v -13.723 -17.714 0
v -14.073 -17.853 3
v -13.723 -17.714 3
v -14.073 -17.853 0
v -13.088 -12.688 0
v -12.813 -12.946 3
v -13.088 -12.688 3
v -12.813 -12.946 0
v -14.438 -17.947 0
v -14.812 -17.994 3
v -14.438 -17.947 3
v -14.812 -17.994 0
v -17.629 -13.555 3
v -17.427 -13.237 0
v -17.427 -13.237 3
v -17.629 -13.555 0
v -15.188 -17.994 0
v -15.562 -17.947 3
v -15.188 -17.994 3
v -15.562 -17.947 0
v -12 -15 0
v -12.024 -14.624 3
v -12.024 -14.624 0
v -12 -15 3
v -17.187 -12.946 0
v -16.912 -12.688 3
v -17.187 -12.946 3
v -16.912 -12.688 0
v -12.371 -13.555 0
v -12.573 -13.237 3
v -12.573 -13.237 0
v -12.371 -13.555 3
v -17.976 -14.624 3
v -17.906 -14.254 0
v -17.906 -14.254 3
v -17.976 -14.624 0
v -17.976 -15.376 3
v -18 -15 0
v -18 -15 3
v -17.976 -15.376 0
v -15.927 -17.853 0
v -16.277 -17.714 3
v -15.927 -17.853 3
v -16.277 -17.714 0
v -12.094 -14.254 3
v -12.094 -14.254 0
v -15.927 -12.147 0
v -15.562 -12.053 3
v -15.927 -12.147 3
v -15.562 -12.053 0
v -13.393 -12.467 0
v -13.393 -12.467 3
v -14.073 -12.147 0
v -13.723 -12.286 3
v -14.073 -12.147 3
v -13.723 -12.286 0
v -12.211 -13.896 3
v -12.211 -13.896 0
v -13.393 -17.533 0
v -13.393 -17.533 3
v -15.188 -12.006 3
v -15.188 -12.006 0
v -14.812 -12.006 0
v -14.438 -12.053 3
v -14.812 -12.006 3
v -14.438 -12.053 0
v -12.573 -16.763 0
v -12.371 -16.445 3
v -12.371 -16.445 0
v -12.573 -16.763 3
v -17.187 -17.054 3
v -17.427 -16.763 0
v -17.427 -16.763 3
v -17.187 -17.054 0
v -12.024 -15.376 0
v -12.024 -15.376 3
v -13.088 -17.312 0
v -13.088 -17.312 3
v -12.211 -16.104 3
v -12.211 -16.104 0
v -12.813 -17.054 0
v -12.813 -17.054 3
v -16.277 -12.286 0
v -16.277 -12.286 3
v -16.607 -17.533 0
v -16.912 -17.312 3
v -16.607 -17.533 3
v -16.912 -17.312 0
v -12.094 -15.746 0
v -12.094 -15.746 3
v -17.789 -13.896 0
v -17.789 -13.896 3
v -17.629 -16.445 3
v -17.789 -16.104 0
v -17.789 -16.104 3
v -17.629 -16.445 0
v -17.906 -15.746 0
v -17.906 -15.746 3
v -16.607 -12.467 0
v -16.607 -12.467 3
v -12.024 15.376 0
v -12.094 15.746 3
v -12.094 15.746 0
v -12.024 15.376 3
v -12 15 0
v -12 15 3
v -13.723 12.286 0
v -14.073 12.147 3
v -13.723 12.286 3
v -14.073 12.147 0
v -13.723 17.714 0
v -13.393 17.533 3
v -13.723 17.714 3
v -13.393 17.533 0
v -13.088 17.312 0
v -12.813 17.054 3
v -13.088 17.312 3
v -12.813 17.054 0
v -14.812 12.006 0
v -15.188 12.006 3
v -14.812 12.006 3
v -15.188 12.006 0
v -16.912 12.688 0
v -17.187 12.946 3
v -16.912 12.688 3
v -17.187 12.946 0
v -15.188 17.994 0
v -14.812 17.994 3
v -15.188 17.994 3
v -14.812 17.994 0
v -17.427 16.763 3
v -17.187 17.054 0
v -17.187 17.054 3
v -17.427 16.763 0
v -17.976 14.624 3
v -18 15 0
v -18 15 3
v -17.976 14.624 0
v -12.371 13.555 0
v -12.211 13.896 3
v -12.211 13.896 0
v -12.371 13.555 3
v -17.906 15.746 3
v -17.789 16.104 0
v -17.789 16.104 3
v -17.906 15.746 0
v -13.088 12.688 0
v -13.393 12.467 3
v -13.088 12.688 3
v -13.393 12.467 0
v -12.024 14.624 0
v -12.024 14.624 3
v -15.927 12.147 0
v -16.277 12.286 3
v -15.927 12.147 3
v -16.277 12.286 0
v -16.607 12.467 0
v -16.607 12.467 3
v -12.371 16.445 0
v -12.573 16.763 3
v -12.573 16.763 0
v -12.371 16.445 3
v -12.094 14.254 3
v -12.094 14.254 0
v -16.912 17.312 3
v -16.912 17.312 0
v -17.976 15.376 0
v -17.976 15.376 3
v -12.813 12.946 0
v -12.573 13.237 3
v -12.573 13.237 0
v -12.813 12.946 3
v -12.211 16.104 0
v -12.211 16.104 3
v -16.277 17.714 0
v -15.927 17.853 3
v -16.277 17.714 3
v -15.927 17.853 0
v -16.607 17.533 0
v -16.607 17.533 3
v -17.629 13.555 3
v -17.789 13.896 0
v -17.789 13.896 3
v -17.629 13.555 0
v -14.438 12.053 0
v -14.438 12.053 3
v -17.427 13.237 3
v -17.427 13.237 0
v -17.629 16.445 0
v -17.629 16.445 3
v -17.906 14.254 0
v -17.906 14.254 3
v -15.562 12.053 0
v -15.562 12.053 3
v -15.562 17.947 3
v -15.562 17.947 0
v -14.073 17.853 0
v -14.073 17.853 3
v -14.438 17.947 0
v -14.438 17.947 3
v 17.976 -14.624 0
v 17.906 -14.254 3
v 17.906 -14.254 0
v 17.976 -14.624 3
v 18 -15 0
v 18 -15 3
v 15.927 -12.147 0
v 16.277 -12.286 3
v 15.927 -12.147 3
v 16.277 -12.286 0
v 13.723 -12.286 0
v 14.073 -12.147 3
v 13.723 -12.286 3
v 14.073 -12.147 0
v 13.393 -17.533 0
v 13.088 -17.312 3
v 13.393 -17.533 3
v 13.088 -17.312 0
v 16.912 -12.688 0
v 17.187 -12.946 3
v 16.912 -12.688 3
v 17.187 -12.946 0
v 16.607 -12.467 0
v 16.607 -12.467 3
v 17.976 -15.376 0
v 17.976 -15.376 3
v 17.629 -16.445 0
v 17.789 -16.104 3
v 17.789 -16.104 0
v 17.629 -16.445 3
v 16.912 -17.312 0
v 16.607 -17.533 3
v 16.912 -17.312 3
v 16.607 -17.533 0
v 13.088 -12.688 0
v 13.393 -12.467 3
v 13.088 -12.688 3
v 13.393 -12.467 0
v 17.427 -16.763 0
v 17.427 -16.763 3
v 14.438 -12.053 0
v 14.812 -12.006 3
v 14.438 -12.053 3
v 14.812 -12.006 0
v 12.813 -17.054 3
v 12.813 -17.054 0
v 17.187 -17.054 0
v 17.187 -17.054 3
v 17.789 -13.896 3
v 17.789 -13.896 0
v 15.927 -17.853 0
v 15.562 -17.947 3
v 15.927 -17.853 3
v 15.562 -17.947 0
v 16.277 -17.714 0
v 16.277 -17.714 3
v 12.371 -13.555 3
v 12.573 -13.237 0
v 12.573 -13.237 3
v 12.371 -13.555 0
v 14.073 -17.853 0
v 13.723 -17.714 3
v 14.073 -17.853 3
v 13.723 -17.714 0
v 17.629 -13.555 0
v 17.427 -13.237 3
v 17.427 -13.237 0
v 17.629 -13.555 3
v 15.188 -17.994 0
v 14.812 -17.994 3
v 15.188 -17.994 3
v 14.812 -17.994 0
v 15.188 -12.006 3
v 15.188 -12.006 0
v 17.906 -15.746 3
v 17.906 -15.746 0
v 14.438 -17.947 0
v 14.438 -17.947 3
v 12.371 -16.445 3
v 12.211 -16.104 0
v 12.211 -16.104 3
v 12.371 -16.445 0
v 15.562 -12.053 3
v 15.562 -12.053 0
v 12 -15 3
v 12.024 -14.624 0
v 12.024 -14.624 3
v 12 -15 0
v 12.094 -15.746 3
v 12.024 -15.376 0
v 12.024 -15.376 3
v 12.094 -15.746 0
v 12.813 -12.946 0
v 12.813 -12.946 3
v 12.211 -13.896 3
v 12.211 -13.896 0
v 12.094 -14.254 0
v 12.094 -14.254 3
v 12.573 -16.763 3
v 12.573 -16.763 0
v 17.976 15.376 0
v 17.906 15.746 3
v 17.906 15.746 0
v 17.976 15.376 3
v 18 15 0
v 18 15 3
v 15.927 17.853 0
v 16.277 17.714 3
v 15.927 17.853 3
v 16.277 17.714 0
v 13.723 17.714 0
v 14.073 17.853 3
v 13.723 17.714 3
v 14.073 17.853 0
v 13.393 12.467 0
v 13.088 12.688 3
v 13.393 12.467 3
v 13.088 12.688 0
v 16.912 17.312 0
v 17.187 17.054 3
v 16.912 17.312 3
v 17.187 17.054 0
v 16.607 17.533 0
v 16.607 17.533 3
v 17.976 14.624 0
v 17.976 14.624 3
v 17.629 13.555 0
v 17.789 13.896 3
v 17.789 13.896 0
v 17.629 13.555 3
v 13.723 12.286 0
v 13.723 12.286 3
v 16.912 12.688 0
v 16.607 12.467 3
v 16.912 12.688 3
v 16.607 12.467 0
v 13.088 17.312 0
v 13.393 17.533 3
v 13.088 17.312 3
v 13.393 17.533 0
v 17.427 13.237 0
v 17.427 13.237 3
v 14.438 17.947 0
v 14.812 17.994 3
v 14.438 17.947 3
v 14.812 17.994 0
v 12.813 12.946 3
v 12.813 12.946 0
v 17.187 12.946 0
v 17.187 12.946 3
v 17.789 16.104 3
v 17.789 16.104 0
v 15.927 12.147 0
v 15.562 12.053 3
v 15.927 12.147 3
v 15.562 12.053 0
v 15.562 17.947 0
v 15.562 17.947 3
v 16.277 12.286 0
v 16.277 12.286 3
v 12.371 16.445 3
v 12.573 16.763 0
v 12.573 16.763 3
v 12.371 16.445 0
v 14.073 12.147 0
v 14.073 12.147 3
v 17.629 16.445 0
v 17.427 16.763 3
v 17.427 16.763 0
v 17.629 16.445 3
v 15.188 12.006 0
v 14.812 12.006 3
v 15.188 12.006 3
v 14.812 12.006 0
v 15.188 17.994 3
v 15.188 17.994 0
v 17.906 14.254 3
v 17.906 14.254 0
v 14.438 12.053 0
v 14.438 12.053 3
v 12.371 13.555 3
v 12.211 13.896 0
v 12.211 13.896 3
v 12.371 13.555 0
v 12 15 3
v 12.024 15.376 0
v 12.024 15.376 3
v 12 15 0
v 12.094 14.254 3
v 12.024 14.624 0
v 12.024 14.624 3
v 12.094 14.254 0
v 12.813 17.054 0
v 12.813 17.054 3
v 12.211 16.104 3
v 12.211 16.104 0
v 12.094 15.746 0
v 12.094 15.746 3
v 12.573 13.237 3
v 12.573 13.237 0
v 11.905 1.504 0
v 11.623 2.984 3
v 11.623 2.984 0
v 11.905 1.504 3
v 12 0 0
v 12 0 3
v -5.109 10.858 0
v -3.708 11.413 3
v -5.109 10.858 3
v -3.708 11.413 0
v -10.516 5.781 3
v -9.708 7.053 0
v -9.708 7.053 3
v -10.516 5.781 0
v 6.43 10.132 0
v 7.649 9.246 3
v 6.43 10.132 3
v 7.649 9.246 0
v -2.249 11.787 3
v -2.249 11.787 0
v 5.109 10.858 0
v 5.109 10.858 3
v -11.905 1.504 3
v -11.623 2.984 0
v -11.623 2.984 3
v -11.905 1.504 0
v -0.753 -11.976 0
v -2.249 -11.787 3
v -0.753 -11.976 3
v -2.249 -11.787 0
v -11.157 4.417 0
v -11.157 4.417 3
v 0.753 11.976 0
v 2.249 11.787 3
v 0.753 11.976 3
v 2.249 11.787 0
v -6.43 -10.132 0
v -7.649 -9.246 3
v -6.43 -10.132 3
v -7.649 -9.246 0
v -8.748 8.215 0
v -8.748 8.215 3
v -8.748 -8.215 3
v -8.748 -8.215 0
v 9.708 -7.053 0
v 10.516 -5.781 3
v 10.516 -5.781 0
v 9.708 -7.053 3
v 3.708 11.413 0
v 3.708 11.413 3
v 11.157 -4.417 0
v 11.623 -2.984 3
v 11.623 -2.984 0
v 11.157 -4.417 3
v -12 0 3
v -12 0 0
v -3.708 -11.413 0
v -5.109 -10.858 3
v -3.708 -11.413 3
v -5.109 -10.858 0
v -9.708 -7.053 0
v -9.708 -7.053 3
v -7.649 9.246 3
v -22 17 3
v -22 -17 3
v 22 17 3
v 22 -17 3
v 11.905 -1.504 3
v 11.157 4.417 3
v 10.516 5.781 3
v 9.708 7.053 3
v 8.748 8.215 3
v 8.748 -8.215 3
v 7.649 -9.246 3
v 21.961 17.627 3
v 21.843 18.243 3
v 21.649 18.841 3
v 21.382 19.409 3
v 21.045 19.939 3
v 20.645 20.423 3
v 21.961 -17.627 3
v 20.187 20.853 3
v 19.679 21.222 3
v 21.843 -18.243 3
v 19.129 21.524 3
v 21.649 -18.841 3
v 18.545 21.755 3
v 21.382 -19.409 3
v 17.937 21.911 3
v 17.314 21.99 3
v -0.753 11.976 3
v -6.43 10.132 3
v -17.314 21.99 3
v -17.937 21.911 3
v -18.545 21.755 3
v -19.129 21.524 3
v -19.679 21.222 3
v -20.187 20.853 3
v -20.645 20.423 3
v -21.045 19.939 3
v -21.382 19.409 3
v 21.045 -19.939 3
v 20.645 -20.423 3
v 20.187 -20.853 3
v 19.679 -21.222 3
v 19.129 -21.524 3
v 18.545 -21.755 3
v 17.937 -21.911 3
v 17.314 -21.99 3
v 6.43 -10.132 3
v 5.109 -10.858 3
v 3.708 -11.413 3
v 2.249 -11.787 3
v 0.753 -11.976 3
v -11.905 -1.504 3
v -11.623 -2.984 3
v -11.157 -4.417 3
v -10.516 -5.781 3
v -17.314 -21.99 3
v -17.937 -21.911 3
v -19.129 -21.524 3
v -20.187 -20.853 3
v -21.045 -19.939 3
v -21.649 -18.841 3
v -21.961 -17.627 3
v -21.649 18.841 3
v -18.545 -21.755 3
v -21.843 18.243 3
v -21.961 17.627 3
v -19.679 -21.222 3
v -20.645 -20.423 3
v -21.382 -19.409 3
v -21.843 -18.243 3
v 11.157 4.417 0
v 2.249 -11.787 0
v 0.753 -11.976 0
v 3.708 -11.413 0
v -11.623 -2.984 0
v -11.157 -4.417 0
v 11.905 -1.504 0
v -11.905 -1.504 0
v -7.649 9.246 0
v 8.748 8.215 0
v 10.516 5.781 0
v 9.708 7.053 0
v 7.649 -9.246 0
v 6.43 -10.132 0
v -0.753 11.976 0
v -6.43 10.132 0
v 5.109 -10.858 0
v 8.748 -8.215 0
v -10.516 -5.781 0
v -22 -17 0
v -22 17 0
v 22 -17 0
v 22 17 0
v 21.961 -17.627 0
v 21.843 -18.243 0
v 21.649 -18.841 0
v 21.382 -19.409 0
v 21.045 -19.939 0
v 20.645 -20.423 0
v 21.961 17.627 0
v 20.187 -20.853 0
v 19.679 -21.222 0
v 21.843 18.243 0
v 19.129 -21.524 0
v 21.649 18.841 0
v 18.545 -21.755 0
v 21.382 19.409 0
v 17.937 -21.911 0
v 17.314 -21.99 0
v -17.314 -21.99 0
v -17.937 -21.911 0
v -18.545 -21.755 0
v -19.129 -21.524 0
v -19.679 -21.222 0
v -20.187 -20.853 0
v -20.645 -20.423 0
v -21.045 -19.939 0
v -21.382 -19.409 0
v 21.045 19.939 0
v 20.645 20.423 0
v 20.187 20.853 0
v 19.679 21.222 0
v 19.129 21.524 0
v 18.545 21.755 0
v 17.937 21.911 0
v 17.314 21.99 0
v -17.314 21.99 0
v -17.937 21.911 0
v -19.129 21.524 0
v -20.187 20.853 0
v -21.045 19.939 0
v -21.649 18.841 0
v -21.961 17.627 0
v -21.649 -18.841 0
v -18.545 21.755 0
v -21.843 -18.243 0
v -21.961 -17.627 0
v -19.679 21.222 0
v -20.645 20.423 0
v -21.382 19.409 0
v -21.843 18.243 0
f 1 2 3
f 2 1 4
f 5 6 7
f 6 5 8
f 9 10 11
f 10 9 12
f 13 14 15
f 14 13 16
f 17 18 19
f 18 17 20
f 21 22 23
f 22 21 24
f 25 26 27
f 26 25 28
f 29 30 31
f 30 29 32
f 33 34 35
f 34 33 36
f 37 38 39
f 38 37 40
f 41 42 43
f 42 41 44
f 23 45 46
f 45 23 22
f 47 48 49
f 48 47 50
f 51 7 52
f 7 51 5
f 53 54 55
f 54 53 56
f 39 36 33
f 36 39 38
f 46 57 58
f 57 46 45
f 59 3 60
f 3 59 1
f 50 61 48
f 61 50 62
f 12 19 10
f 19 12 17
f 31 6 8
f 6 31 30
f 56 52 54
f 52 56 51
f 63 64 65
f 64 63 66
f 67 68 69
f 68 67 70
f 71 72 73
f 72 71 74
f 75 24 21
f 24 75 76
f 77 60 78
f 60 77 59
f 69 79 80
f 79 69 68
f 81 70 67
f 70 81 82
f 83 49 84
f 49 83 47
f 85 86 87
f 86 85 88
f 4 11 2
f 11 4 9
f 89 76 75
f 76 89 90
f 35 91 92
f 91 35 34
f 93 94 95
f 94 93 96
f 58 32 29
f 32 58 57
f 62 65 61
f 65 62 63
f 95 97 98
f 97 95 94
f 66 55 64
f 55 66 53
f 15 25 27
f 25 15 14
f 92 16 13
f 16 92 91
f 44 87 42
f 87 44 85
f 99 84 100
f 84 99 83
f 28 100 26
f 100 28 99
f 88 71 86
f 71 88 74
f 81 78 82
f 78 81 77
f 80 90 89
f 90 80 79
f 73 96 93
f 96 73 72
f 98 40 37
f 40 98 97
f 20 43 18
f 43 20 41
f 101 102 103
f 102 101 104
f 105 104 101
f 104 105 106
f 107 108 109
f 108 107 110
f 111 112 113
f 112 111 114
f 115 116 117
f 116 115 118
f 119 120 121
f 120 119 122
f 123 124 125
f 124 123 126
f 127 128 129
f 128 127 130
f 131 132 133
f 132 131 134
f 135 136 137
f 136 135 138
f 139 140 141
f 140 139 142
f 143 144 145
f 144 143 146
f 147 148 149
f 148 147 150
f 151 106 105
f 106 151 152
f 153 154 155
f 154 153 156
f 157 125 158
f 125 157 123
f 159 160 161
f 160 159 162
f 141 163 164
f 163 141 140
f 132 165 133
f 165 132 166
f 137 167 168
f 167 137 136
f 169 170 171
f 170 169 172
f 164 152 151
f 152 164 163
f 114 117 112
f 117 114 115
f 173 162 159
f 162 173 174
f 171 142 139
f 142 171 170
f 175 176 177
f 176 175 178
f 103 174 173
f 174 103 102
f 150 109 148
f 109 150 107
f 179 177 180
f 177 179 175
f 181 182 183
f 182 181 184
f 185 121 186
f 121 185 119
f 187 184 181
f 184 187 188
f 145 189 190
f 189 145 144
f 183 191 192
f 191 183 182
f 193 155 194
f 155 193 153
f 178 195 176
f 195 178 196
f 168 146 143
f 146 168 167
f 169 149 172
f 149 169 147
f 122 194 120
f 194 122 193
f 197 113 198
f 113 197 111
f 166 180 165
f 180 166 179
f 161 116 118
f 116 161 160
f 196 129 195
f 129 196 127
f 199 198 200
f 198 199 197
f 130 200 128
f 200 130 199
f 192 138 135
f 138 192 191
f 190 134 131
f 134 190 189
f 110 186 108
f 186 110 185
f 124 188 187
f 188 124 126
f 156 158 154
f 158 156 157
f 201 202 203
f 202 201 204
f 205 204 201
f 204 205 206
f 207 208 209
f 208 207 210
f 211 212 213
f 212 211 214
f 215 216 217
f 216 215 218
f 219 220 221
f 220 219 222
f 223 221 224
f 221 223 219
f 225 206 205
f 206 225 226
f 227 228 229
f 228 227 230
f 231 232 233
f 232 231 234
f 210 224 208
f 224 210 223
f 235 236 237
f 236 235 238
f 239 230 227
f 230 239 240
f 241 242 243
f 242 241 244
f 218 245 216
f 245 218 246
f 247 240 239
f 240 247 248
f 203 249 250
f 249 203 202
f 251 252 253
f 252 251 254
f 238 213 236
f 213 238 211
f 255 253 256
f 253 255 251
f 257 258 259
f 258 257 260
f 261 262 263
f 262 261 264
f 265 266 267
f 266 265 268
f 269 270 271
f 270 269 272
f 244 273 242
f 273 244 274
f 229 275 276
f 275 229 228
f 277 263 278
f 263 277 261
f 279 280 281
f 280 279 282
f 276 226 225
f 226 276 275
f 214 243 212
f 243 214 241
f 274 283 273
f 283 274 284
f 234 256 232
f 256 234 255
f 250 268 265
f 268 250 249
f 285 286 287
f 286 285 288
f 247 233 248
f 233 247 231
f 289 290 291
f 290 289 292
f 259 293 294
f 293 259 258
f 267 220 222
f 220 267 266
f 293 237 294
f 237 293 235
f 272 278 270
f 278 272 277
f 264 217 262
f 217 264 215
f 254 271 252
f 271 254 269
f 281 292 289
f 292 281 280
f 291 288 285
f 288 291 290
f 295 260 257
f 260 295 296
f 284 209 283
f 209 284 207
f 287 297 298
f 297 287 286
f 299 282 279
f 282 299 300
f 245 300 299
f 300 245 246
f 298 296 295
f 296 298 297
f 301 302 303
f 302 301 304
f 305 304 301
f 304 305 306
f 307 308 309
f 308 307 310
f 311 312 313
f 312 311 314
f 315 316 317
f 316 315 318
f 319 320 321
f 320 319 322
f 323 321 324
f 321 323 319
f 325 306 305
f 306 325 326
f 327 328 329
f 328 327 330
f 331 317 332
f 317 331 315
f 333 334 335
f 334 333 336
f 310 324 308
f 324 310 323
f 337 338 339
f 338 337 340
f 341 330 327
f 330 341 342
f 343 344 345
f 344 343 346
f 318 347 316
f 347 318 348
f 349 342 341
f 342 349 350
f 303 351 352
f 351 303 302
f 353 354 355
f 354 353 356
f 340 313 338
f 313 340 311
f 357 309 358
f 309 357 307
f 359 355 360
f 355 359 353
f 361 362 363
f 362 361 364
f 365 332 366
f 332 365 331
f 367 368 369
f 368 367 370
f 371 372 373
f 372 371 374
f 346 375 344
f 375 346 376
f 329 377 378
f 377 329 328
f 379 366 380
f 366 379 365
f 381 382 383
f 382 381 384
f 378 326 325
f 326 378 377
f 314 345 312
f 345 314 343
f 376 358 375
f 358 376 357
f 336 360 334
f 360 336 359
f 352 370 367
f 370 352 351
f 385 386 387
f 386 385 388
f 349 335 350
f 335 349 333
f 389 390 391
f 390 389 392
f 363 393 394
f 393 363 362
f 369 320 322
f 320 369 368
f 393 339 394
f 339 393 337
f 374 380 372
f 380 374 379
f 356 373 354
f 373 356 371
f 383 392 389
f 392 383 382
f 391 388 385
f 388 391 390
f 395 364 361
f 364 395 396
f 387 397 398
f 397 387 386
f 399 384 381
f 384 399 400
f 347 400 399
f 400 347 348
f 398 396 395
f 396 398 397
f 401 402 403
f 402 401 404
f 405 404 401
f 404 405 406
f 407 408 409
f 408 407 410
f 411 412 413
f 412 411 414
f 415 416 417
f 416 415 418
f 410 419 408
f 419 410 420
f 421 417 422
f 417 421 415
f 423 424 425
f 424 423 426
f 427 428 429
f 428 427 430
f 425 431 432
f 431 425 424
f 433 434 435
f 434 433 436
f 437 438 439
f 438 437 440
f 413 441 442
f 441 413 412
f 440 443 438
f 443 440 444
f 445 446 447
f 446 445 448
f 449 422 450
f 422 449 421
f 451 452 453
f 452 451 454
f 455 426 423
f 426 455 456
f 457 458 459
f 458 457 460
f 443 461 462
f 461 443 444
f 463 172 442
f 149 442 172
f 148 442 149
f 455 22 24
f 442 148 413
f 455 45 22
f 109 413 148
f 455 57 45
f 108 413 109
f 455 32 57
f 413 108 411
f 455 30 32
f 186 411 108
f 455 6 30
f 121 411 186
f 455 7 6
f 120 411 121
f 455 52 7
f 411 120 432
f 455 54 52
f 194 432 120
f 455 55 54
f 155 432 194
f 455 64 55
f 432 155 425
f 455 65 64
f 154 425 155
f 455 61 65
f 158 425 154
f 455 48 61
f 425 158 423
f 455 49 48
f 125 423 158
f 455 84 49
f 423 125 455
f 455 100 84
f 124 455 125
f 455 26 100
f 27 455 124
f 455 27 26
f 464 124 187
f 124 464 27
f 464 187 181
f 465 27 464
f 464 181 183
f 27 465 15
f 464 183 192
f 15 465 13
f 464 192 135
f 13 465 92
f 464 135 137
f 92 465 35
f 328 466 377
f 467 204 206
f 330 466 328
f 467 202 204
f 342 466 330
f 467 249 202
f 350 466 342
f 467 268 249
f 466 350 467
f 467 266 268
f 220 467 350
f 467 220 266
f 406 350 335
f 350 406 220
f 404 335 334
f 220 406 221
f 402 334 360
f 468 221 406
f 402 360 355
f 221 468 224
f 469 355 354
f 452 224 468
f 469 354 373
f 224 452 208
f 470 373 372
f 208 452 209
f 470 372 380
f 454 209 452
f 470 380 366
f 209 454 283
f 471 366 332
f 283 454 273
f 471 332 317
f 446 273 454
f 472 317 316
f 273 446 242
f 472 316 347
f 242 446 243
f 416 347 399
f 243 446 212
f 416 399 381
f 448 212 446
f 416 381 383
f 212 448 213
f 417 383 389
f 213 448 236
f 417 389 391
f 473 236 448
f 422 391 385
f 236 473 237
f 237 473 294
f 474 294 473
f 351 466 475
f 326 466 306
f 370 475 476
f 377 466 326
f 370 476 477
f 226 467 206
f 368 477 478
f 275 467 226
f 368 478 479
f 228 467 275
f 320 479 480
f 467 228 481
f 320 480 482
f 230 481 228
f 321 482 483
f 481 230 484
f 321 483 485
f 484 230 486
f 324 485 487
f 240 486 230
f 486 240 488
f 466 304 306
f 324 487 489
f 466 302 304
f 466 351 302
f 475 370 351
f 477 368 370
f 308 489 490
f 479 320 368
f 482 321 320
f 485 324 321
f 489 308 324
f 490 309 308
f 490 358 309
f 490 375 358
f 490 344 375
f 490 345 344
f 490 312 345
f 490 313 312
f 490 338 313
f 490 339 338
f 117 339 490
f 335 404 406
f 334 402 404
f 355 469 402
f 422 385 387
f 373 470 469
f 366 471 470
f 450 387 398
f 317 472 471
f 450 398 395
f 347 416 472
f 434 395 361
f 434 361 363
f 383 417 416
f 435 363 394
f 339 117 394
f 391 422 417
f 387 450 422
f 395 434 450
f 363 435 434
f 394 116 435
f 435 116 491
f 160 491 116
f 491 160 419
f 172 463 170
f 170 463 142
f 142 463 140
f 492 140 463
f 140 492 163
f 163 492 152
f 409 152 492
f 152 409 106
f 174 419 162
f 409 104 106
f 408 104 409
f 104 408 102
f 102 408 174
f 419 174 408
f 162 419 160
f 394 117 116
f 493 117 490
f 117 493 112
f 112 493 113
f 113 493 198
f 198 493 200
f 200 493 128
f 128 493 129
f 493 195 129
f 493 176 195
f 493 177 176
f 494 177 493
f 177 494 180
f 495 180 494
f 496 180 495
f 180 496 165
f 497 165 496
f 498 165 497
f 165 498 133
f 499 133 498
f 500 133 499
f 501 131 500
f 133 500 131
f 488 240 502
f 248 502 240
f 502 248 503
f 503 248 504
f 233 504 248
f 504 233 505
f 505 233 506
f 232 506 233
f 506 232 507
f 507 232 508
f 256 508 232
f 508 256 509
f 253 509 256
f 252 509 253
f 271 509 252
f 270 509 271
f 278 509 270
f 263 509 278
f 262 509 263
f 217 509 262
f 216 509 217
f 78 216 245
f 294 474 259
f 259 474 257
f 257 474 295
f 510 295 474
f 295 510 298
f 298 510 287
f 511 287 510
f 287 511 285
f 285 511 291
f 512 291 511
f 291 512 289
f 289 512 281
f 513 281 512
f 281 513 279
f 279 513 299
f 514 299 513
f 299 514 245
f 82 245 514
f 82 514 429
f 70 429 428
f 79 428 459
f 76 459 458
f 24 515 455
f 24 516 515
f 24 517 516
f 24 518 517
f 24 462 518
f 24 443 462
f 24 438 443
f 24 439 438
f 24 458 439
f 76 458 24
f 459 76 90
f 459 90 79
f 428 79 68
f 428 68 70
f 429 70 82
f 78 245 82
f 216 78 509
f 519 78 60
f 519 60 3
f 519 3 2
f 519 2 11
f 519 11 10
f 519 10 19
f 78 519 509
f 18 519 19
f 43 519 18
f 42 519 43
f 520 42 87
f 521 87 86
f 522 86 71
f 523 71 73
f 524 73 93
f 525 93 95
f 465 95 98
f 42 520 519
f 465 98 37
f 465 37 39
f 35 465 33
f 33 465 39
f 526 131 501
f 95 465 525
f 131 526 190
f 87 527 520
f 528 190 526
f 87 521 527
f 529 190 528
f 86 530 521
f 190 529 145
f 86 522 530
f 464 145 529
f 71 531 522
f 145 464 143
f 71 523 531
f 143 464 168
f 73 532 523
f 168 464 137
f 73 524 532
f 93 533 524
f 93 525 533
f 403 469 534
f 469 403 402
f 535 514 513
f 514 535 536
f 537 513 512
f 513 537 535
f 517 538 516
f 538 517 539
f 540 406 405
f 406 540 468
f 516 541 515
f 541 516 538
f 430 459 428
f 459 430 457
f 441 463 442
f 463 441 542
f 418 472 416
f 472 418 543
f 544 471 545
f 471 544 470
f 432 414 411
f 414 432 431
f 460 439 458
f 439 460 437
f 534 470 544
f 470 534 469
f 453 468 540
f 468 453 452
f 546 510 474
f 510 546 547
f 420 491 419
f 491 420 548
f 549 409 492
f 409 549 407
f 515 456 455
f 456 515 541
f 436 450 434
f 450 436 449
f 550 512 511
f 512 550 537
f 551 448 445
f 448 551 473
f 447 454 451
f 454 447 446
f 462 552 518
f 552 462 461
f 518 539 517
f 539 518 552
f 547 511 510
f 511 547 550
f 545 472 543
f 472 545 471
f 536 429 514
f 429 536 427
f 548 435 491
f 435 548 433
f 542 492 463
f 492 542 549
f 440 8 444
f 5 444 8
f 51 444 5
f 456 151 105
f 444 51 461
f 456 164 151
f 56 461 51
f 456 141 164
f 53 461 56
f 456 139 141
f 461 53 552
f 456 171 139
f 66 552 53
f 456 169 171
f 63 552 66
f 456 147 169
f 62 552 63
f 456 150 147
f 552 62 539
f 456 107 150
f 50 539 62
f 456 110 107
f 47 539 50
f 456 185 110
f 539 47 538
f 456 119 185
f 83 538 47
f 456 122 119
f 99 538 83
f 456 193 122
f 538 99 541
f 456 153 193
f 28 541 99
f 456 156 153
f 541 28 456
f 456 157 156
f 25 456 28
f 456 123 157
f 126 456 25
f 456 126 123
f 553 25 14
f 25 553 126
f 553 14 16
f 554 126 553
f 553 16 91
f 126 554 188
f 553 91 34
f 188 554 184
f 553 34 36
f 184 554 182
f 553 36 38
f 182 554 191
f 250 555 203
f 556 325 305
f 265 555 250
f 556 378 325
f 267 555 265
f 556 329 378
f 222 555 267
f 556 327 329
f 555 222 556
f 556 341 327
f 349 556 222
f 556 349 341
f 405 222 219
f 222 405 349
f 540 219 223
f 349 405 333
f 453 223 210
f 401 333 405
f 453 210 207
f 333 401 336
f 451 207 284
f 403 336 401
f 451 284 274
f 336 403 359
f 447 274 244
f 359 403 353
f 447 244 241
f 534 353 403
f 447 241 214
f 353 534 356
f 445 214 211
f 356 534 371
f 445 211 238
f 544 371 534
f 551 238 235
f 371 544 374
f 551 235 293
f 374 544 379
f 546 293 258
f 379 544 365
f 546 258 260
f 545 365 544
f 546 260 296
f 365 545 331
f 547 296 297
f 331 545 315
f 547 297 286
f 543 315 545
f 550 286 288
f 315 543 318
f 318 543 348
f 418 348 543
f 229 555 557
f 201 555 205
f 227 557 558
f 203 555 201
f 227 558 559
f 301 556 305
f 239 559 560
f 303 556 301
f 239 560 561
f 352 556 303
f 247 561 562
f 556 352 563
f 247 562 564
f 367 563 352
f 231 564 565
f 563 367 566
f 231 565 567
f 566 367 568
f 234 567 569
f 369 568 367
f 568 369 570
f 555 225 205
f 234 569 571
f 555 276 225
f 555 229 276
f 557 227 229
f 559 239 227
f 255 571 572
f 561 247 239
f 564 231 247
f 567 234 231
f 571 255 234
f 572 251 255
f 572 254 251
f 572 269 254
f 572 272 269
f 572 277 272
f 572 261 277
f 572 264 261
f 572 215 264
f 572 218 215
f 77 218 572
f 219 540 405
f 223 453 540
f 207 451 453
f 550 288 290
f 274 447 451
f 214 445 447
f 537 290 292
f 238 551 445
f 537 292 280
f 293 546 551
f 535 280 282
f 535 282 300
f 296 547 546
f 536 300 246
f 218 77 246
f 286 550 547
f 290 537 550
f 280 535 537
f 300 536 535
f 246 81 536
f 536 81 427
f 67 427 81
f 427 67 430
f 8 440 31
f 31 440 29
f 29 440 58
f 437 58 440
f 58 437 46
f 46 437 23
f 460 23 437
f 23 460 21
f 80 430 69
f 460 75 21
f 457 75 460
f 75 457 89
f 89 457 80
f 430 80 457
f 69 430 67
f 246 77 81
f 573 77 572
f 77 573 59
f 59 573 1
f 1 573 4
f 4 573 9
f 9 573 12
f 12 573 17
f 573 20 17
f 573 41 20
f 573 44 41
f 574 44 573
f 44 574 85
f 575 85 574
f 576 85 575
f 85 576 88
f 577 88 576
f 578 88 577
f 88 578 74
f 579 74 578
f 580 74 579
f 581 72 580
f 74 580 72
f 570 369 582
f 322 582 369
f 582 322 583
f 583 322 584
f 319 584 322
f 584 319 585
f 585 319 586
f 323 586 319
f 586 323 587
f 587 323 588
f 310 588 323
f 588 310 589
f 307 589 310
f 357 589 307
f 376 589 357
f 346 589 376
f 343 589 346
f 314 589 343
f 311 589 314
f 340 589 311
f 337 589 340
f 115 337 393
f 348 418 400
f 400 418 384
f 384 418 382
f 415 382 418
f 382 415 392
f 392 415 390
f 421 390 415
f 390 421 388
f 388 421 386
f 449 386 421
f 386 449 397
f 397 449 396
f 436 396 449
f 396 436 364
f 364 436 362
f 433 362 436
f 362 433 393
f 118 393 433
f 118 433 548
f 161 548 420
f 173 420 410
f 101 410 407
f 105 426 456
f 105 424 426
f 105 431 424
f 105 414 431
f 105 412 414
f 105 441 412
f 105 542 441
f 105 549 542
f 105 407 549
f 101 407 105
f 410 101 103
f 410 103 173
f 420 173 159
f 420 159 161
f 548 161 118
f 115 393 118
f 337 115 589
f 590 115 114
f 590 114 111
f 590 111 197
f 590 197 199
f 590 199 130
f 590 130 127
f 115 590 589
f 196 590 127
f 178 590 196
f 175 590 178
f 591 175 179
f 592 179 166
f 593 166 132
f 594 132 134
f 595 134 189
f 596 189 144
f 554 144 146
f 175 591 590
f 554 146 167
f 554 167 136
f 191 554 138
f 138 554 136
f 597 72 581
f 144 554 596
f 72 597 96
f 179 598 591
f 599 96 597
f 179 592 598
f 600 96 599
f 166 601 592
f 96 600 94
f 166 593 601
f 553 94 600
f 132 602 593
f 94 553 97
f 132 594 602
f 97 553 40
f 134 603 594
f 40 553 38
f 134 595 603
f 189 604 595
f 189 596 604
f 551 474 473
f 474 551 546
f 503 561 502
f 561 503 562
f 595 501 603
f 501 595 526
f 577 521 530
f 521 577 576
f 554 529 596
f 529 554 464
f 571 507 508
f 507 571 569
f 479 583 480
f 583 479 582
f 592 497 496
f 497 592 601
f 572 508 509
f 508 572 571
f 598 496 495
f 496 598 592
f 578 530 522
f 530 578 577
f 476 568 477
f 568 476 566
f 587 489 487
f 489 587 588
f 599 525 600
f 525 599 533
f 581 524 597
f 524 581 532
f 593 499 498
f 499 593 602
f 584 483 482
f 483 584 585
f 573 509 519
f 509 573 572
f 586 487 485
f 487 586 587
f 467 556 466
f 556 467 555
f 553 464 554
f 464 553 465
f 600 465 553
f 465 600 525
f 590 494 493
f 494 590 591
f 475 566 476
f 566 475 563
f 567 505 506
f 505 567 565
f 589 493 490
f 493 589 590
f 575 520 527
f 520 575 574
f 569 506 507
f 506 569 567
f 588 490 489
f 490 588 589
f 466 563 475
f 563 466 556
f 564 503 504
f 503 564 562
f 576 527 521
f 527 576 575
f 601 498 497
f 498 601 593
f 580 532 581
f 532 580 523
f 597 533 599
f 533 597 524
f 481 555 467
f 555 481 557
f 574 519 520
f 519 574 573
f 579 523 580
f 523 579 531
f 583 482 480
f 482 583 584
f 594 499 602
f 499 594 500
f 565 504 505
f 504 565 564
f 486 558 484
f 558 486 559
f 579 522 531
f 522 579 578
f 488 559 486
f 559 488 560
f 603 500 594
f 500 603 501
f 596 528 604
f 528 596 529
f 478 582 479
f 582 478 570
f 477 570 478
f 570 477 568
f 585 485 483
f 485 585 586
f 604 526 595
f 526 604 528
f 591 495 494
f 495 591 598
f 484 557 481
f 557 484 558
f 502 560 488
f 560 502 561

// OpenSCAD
$fn = 50;


difference() {
	union() {
		hull() {
			translate(v = [-17.0000000000, 17.0000000000, 0]) {
				cylinder(h = 3, r = 5);
			}
			translate(v = [17.0000000000, 17.0000000000, 0]) {
				cylinder(h = 3, r = 5);
			}
			translate(v = [-17.0000000000, -17.0000000000, 0]) {
				cylinder(h = 3, r = 5);
			}
			translate(v = [17.0000000000, -17.0000000000, 0]) {
				cylinder(h = 3, r = 5);
			}
		}
	}
	union() {
		#translate(v = [-15.0000000000, -15.0000000000, -100.0000000000]) {
			cylinder(h = 200, r = 3.0000000000);
		}
		#translate(v = [-15.0000000000, 15.0000000000, -100.0000000000]) {
			cylinder(h = 200, r = 3.0000000000);
		}
		#translate(v = [15.0000000000, -15.0000000000, -100.0000000000]) {
			cylinder(h = 200, r = 3.0000000000);
		}
		#translate(v = [15.0000000000, 15.0000000000, -100.0000000000]) {
			cylinder(h = 200, r = 3.0000000000);
		}
		#cylinder(h = 3, r = 12.0000000000);
	}
}
